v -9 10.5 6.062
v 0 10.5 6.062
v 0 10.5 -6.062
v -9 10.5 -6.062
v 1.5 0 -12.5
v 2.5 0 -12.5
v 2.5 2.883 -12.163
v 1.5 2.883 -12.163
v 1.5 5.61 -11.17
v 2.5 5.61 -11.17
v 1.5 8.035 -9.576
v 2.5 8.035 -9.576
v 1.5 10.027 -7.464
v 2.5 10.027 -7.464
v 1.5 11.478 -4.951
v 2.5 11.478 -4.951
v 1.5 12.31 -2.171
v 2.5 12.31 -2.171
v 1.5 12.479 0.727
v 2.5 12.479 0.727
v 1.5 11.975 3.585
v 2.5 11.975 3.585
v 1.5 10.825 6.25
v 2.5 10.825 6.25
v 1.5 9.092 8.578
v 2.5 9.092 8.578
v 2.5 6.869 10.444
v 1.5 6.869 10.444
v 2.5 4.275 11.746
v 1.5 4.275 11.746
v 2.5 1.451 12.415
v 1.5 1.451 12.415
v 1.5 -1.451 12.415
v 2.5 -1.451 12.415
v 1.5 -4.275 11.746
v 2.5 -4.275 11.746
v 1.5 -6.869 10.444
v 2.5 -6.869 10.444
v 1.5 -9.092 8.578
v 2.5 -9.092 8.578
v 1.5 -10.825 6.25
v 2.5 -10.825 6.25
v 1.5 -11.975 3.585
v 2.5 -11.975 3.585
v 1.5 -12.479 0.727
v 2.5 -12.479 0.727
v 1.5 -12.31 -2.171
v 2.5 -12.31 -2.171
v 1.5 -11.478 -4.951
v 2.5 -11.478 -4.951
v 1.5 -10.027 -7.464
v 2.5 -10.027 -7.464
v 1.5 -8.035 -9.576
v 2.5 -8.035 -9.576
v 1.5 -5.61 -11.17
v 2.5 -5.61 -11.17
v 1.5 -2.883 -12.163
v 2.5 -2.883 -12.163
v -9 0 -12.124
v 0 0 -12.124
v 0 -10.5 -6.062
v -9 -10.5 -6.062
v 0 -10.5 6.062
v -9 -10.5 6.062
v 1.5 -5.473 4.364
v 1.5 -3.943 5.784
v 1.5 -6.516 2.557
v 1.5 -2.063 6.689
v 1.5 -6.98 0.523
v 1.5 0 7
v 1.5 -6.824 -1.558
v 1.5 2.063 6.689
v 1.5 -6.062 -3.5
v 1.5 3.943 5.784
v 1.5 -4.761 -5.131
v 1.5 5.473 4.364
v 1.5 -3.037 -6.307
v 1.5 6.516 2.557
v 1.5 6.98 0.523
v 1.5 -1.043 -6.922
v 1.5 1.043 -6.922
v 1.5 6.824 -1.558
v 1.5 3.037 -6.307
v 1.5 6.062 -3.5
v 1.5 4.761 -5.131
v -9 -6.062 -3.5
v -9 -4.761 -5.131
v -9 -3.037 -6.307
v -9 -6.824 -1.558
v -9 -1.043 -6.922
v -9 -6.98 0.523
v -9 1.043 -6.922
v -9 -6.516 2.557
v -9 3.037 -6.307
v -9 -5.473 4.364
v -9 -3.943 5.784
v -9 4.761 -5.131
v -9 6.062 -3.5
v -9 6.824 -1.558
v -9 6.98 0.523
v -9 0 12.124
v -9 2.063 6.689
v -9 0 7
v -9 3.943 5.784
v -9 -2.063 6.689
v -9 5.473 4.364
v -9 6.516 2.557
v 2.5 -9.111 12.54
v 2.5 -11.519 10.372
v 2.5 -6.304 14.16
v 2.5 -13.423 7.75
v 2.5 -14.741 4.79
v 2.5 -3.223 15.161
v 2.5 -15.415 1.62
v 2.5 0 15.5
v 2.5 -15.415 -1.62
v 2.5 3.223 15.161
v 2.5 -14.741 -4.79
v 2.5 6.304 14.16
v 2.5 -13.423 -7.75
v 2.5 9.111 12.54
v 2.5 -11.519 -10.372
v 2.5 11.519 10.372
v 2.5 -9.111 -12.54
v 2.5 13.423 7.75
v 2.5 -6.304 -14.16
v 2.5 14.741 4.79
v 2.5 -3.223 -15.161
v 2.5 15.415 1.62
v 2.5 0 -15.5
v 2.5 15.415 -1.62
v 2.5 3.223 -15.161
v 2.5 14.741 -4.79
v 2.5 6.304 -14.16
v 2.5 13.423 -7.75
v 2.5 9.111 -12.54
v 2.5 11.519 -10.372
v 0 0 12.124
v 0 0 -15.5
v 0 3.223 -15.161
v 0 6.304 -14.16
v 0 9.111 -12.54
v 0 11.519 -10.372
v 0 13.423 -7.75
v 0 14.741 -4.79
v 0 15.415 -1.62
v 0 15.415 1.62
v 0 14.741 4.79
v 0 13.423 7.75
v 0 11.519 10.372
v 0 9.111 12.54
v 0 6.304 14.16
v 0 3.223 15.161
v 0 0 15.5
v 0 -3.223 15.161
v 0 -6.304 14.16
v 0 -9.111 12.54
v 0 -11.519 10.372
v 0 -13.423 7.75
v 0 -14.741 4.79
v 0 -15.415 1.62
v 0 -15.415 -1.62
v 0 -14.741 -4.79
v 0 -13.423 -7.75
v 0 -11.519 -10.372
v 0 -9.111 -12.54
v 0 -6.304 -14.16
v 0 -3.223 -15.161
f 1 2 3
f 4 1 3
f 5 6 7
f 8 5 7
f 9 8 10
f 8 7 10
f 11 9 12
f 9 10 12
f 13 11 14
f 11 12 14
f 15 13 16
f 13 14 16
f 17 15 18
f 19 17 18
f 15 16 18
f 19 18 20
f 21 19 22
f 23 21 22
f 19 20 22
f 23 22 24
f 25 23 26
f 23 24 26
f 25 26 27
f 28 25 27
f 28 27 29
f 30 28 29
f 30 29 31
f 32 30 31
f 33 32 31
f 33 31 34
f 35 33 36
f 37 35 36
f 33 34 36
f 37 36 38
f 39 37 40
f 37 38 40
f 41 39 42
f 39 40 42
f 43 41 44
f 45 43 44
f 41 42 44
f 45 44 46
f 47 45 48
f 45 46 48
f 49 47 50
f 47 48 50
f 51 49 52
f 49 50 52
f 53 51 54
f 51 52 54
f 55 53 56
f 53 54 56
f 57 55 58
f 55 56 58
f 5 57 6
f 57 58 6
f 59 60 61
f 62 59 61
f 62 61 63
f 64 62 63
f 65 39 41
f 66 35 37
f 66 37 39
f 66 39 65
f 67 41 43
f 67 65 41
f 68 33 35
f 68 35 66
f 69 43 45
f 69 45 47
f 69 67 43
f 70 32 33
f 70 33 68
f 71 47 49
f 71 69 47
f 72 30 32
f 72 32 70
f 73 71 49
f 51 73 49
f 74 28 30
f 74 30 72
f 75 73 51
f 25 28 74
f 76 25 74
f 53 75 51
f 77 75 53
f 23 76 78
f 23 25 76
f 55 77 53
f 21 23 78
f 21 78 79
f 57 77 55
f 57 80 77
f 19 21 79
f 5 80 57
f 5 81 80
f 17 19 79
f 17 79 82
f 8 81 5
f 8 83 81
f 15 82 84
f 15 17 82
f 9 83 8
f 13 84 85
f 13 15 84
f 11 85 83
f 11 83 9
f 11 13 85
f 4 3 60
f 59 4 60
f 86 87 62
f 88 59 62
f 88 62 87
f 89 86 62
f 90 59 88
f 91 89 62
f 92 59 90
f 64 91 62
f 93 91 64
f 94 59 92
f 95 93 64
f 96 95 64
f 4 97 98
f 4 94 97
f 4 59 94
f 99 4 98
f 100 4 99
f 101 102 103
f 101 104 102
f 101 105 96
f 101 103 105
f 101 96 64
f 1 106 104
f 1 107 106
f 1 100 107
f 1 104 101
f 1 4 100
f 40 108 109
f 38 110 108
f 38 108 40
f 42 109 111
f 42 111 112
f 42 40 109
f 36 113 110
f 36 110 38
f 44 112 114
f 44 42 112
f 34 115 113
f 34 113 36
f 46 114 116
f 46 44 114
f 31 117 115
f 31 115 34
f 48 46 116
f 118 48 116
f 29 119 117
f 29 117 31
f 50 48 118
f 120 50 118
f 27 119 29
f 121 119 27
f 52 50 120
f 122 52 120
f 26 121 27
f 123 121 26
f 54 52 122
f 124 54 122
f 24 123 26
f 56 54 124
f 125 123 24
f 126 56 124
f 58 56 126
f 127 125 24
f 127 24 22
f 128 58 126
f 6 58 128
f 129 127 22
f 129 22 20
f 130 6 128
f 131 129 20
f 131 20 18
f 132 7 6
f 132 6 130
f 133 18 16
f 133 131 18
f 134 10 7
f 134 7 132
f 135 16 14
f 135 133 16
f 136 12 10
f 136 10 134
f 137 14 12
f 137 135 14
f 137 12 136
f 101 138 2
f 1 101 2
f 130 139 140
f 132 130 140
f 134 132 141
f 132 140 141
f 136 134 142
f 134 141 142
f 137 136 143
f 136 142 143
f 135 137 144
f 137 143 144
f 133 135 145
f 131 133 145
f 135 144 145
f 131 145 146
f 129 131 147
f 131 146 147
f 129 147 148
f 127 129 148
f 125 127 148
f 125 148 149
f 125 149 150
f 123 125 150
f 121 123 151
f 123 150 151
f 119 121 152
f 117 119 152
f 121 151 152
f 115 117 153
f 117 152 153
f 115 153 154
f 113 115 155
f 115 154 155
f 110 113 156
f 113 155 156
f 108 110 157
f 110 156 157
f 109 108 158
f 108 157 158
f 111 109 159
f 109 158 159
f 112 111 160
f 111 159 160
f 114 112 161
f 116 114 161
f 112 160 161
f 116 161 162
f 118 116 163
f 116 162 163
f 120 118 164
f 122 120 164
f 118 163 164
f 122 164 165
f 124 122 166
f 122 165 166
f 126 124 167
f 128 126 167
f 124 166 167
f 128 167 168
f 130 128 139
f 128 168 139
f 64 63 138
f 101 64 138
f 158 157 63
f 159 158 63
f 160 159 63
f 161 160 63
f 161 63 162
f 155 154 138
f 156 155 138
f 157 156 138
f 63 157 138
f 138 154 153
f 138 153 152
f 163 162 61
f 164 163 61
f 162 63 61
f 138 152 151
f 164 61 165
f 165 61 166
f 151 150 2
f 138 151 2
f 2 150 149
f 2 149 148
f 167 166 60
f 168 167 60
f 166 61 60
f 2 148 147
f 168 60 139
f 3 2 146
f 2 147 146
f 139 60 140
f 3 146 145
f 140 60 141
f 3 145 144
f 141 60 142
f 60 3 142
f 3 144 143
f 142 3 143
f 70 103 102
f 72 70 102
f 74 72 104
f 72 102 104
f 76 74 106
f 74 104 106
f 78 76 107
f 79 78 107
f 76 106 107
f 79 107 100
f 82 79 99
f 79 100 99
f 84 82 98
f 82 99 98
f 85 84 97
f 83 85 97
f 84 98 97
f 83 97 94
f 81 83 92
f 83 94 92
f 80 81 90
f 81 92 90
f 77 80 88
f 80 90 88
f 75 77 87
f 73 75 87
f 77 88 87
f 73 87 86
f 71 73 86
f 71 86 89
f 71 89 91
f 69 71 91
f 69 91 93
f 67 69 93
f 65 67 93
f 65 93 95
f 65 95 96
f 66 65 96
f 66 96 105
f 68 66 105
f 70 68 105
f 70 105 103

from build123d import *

# Parameters (mm, degrees)
SKETCH1_R               = 15.5
BOSS_EXTRUDE2_DEPTH     = 2.5
SKETCH2_R               = 12.5
CUT_EXTRUDE1_DEPTH      = 1
BOSS_EXTRUDE3_DEPTH     = 9
SKETCH4_R               = 7
CUT_EXTRUDE2_DEPTH      = 1
CUT_EXTRUDE2_DEPTH_BACK = 12.5


with BuildPart() as part:
    # Sketch1 → Boss-Extrude2 (new body)
    with BuildSketch(Plane(origin=(0, 0, 0), x_dir=(0, 0, -1), z_dir=(1, 0, 0))):
        Circle(SKETCH1_R)
    extrude(amount=BOSS_EXTRUDE2_DEPTH)

    # Sketch2 → Cut-Extrude1 (cut)
    with BuildSketch(Plane(origin=(2.5, 0, 0), x_dir=(0, 0, -1), z_dir=(1, 0, 0))):
        Circle(SKETCH2_R)
    extrude(amount=-CUT_EXTRUDE1_DEPTH, mode=Mode.SUBTRACT)

    # Sketch3 → Boss-Extrude3 (add)
    with BuildSketch(Plane.ZY):
        Polygon((12.124355653, 0), (6.062177826, 10.5), (-6.062177826, 10.5), (-12.124355653, 0), (-6.062177826, -10.5), (6.062177826, -10.5), align=None)
    extrude(amount=BOSS_EXTRUDE3_DEPTH)

    # Sketch4 → Cut-Extrude2 (cut, two sides)
    with BuildSketch(Plane.ZY.offset(9)) as cut_extrude2_sk:
        Circle(SKETCH4_R)
    extrude(amount=CUT_EXTRUDE2_DEPTH, mode=Mode.SUBTRACT)
    extrude(cut_extrude2_sk.sketch, amount=-CUT_EXTRUDE2_DEPTH_BACK, mode=Mode.SUBTRACT)


solid = part.part
